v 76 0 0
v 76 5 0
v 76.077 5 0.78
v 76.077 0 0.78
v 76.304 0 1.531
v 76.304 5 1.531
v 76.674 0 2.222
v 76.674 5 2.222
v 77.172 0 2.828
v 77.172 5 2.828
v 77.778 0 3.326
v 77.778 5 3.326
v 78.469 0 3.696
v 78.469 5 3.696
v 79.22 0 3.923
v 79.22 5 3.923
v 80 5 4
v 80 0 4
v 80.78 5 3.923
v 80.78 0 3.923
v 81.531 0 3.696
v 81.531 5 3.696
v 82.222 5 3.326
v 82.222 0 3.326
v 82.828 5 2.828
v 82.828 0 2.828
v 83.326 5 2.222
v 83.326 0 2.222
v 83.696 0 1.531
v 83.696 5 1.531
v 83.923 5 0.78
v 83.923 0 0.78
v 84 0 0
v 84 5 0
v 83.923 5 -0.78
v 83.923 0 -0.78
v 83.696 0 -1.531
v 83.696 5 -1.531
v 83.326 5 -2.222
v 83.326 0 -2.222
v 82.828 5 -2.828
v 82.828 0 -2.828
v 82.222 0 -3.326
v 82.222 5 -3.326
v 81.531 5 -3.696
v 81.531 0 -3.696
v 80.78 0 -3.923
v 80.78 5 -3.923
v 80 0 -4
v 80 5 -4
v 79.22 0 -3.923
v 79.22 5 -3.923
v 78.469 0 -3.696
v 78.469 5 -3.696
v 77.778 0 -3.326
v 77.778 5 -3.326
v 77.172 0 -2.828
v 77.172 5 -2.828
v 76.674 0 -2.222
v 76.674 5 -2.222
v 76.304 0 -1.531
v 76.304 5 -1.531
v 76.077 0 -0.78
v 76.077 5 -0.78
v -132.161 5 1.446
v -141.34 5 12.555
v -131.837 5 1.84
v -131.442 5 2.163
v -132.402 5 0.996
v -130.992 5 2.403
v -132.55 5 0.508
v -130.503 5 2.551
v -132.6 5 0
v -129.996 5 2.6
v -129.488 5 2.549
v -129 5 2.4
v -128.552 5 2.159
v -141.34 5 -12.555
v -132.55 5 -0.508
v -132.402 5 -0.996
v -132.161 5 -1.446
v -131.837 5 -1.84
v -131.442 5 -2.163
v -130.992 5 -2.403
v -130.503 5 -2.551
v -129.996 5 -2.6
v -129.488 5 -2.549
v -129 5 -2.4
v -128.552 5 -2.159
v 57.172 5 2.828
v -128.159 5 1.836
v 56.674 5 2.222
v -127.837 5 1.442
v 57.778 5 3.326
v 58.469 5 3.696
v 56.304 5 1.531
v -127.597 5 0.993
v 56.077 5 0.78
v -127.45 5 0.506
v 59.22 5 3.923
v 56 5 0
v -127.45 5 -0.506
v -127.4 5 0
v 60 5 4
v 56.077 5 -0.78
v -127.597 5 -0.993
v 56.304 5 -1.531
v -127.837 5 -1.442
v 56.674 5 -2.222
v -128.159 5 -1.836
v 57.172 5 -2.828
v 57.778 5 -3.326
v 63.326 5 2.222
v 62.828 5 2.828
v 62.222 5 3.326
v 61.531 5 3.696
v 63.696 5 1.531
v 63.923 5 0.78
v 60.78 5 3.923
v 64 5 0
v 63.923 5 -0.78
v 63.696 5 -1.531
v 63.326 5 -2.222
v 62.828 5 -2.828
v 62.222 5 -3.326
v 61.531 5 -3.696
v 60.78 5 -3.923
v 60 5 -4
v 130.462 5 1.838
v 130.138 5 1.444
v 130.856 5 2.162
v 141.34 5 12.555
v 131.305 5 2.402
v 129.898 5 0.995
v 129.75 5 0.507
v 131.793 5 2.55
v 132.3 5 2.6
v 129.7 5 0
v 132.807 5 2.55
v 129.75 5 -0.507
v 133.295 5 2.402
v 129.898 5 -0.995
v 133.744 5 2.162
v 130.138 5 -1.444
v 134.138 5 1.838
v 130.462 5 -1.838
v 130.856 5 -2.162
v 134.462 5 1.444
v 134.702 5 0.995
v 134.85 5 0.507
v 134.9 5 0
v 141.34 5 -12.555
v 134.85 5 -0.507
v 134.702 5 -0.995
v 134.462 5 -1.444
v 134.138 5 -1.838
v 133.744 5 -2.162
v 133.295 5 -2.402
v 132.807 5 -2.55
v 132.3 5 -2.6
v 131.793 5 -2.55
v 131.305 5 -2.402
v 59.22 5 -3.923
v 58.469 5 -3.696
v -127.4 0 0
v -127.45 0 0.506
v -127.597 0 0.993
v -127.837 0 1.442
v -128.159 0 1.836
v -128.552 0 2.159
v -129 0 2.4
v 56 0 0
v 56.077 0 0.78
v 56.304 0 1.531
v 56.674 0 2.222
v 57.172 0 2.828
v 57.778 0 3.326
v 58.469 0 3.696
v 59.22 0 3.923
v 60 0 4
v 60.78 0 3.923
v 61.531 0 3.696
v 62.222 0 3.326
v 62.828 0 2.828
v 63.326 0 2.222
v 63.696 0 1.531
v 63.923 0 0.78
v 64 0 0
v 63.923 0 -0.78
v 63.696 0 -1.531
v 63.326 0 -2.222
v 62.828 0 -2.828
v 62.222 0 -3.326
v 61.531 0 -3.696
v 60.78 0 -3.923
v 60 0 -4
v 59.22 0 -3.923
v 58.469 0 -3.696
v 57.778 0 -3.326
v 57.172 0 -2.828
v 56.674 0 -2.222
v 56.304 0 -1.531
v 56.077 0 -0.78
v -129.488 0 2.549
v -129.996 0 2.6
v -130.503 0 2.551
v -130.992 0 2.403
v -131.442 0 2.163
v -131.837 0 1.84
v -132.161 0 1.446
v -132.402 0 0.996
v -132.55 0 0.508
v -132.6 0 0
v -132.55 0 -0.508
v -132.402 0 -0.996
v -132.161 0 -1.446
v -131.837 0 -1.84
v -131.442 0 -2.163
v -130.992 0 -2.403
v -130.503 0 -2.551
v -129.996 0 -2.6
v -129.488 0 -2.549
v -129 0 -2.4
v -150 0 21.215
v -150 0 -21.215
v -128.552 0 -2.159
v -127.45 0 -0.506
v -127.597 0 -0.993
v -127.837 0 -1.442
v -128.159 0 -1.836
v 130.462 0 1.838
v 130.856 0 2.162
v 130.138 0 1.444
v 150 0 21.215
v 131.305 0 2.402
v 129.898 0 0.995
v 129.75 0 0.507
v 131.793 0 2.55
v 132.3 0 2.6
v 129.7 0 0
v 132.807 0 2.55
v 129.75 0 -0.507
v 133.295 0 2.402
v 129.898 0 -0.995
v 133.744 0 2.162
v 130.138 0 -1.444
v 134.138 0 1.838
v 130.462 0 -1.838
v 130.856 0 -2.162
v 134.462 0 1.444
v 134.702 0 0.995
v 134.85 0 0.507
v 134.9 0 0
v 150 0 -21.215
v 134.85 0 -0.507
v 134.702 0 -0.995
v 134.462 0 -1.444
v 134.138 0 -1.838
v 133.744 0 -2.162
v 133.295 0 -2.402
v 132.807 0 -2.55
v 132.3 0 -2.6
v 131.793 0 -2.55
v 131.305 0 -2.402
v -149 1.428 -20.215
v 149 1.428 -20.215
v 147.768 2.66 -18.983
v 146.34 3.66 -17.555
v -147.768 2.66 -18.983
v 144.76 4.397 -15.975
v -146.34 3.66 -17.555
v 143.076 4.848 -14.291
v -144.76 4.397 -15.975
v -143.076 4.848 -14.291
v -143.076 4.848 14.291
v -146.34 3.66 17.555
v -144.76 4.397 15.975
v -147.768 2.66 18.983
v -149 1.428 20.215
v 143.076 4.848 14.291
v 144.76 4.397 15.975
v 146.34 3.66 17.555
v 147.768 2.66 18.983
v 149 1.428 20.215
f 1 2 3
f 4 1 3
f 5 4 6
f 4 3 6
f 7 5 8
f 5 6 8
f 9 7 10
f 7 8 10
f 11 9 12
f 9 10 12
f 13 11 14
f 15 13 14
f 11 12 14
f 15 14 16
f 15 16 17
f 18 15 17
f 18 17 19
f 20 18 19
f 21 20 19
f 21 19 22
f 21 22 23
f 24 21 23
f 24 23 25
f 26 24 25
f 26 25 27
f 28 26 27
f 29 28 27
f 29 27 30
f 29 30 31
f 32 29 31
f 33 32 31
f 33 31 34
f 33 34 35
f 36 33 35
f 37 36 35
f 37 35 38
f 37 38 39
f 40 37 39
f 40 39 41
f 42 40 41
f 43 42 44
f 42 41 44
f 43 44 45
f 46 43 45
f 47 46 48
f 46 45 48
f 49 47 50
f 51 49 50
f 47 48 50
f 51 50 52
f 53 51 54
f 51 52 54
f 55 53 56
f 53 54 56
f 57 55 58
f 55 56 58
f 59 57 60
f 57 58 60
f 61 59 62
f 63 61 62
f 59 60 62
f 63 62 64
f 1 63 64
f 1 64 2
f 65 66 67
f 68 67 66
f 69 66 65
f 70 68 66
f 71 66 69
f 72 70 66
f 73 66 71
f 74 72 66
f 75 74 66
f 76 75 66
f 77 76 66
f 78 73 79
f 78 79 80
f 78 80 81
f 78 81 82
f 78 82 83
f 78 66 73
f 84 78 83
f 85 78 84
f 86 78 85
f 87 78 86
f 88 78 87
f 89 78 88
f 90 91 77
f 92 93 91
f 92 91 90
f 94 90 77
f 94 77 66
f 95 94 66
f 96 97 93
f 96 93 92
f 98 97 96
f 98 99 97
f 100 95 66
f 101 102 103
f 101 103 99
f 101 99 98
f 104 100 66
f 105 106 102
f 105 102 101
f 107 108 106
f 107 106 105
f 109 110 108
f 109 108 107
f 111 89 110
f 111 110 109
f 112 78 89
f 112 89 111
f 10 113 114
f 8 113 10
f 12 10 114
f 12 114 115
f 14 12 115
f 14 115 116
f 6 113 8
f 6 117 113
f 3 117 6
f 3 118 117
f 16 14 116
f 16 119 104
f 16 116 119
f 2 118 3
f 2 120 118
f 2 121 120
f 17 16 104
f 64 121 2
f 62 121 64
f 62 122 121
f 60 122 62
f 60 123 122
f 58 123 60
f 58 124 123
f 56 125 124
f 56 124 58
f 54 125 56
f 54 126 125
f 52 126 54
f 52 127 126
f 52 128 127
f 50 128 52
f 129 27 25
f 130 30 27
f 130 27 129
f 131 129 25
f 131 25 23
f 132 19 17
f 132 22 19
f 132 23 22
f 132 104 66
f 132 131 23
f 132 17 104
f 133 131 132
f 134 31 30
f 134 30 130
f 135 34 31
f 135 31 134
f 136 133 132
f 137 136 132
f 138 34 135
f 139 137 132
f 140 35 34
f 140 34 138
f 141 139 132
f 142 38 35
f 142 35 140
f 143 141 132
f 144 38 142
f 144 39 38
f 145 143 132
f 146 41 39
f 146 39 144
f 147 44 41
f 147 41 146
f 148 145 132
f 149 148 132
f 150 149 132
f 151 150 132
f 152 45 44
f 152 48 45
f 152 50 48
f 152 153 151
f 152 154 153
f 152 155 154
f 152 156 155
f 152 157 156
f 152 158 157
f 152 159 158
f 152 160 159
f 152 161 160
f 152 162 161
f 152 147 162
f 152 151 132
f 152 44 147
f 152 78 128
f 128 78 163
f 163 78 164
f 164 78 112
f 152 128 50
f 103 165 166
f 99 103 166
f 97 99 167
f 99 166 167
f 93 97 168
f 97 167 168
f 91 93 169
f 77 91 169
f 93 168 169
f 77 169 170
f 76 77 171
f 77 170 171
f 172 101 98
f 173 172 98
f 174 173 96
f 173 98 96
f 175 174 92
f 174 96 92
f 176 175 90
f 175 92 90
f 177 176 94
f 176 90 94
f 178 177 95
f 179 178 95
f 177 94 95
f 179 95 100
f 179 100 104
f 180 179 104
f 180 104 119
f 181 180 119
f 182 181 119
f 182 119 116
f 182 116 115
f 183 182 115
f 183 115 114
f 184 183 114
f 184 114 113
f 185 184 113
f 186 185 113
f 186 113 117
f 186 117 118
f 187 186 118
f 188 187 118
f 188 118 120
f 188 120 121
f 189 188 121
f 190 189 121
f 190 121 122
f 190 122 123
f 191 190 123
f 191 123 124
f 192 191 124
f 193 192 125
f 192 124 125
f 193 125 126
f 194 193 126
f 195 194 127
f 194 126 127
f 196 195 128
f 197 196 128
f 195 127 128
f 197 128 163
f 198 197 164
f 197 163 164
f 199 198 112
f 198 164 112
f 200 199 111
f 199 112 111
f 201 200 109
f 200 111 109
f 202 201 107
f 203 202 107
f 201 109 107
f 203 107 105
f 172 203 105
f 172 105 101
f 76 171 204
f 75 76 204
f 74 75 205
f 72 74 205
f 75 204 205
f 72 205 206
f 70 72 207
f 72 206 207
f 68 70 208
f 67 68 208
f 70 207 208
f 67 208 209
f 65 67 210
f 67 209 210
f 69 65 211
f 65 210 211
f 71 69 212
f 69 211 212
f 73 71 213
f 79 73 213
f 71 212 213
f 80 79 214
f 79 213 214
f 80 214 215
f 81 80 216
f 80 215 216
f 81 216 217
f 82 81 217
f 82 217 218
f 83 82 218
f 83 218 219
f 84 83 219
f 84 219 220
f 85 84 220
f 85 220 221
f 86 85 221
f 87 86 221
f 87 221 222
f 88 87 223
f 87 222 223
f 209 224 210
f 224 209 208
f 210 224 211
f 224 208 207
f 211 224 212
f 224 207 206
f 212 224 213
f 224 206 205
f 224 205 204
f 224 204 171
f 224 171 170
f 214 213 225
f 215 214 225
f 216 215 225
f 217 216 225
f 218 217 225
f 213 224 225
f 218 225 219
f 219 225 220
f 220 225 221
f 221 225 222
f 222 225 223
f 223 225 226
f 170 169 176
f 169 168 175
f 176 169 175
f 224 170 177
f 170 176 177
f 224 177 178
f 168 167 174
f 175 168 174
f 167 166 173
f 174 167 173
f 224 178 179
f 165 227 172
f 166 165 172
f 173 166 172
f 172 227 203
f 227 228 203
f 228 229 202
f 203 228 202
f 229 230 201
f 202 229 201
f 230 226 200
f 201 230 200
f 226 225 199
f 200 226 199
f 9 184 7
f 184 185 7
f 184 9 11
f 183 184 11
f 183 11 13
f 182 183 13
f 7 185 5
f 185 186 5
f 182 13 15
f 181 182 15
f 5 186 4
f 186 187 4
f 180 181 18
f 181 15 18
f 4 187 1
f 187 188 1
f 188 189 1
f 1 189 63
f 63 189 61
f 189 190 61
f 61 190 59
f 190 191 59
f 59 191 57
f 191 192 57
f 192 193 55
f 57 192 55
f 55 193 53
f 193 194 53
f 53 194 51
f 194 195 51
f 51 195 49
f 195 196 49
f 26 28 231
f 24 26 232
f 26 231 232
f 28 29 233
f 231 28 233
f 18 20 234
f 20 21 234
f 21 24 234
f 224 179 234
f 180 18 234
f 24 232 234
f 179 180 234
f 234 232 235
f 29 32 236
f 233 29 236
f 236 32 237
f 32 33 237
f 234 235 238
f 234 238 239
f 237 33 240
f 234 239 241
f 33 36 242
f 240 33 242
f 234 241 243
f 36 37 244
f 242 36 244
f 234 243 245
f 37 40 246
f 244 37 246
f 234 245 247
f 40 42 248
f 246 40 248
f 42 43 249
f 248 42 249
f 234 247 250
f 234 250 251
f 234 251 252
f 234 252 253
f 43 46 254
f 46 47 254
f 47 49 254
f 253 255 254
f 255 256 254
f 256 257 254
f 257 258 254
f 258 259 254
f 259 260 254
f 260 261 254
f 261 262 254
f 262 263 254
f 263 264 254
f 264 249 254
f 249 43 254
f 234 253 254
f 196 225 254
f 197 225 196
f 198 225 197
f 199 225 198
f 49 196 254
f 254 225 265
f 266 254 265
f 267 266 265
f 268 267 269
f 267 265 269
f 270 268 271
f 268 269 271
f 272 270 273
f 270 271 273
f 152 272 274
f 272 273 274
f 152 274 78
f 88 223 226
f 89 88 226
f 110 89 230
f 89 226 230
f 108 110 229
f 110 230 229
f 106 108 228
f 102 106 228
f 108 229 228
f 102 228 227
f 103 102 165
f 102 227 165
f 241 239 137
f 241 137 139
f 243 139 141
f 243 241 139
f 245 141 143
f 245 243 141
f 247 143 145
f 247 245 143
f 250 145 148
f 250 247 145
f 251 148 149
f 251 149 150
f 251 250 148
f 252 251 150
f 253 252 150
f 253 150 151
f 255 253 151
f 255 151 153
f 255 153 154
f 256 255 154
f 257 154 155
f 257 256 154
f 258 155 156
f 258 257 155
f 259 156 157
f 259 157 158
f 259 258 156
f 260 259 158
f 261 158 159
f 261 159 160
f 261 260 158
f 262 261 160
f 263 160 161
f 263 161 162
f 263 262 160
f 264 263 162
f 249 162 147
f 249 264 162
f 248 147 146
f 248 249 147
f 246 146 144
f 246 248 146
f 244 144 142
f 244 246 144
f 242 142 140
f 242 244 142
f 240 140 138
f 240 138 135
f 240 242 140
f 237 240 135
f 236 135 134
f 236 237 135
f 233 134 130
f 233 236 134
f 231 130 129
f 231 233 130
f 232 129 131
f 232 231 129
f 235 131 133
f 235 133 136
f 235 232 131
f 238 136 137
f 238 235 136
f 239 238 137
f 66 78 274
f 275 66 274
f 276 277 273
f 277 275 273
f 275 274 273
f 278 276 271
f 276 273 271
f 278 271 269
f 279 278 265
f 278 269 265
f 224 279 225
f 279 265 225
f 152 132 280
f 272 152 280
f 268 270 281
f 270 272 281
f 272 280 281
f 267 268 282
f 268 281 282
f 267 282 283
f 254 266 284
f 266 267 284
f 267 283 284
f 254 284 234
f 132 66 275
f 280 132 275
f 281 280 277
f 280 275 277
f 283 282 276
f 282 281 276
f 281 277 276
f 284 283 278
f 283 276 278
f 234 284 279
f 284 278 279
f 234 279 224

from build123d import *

# Parameters (mm, degrees)
SKETCH_1_W          = 21
SKETCH_1_H          = 42.43
SKETCH_1_R          = 2.6
EXTRUDE_1_DEPTH     = 5
FILLET_1_R          = 10
CUT_EXTRUDE_1_DEPTH = 10


with BuildPart() as part:
    # 草图1 → 凸台-拉伸1 (new body)
    # profile 1 of 3: a face of its own
    with BuildSketch(Plane(origin=(0, 0, 0), x_dir=(1, 0, 0), z_dir=(0, 1, 0))):
        with BuildLine():
            Line((-129, 2.4), (-129, 21.215))
            Line((-129, 21.215), (-150, 21.215))
            Line((-150, 21.215), (-150, -21.215))
            Line((-150, -21.215), (-129, -21.215))
            Line((-129, -21.215), (-129, -2.4))
            ThreePointArc((-129, -2.4), (-132.6, 0), (-129, 2.4))
        make_face()
    # profile 2 of 3: a face of its own
    with BuildSketch(Plane(origin=(0, 0, 0), x_dir=(1, 0, 0), z_dir=(0, 1, 0))):
        with BuildLine():
            Line((129, 21.215), (-129, 21.215))
            Line((-129, 21.215), (-129, 2.4))
            ThreePointArc((-129, 2.4), (-127.836669235, 1.44222051), (-127.4, 0))
            ThreePointArc((-127.4, 0), (-127.836669235, -1.44222051), (-129, -2.4))
            Line((-129, -2.4), (-129, -21.215))
            Line((-129, -21.215), (129, -21.215))
            Line((129, -21.215), (129, 21.215))
        make_face()
    # profile 3 of 3: a face of its own
    with BuildSketch(Plane(origin=(0, 0, 0), x_dir=(1, 0, 0), z_dir=(0, 1, 0))):
        with Locations((139.5, 0)):
            Rectangle(SKETCH_1_W, SKETCH_1_H)
        with Locations(Location((132.3, 0, 0), (0, 0, 270))):
            Circle(SKETCH_1_R, mode=Mode.SUBTRACT)
    extrude(amount=EXTRUDE_1_DEPTH)

    # 圆角1
    # the kernel refuses this fillet: 10 mm, written as the material it takes off along each edge
    with BuildSketch(Plane(origin=(150, 5, 42.865635095), x_dir=(-1, 0, 0), z_dir=(0, 0, -1)), Plane(origin=(-150, 5, -42.865635095), x_dir=(1, 0, 0), z_dir=(0, 0, 1))) as fillet_1_piece_1:
        with BuildLine():
            CenterArc((8.660254038, -10), FILLET_1_R, 90, 60)
            Line((0, -5), (-0.173205081, -4.9))
            ThreePointArc((-0.173205081, -4.9), (-0.2, -2.5), (-0.2, 0))
            Line((-0.2, 0), (0, 0.2))
            Line((0, 0.2), (8.660254038, 0.2))
            Line((8.660254038, 0.2), (8.660254038, 0))
        make_face()
    extrude(amount=85.731270189, mode=Mode.SUBTRACT)
    with BuildSketch(Plane(origin=(-171.650635095, 5, 21.215), x_dir=(0, 0, -1), z_dir=(1, 0, 0))) as fillet_1_piece_2:
        with BuildLine():
            CenterArc((8.660254038, -10), FILLET_1_R, 90, 60)
            Line((0, -5), (-0.173205081, -4.9))
            ThreePointArc((-0.173205081, -4.9), (-0.2, -2.5), (-0.2, 0))
            Line((-0.2, 0), (0, 0.2))
            Line((0, 0.2), (8.660254038, 0.2))
            Line((8.660254038, 0.2), (8.660254038, 0))
        make_face()
    extrude(amount=343.301270189, mode=Mode.SUBTRACT)
    with BuildSketch(Plane(origin=(-171.650635095, 5, -21.215), x_dir=(0, -1, 0), z_dir=(1, 0, 0))) as fillet_1_piece_3:
        with BuildLine():
            CenterArc((10, -8.660254038), FILLET_1_R, 120, 60)
            Line((0, -8.660254038), (-0.2, -8.660254038))
            Line((-0.2, -8.660254038), (-0.2, 0))
            Line((-0.2, 0), (0, 0.2))
            ThreePointArc((0, 0.2), (2.5, 0.2), (4.9, 0.173205081))
            Line((4.9, 0.173205081), (5, 0))
        make_face()
    extrude(amount=343.301270189, mode=Mode.SUBTRACT)

    # 草图2 → 切除-拉伸1 (cut)
    with BuildSketch(Plane(origin=(0, 5, 0), x_dir=(1, 0, 0), z_dir=(0, 1, 0))):
        with BuildLine():
            ThreePointArc((64, 0), (60, 4), (56, 0))
            Line((56, 0), (64, 0))
        make_face()
        with BuildLine():
            Line((64, 0), (56, 0))
            ThreePointArc((56, 0), (60, -4), (64, 0))
        make_face()
        with BuildLine():
            ThreePointArc((84, 0), (80, 4), (76, 0))
            Line((76, 0), (84, 0))
        make_face()
        with BuildLine():
            Line((84, 0), (76, 0))
            ThreePointArc((76, 0), (80, -4), (84, 0))
        make_face()
    extrude(amount=-CUT_EXTRUDE_1_DEPTH, mode=Mode.SUBTRACT)


solid = part.part
